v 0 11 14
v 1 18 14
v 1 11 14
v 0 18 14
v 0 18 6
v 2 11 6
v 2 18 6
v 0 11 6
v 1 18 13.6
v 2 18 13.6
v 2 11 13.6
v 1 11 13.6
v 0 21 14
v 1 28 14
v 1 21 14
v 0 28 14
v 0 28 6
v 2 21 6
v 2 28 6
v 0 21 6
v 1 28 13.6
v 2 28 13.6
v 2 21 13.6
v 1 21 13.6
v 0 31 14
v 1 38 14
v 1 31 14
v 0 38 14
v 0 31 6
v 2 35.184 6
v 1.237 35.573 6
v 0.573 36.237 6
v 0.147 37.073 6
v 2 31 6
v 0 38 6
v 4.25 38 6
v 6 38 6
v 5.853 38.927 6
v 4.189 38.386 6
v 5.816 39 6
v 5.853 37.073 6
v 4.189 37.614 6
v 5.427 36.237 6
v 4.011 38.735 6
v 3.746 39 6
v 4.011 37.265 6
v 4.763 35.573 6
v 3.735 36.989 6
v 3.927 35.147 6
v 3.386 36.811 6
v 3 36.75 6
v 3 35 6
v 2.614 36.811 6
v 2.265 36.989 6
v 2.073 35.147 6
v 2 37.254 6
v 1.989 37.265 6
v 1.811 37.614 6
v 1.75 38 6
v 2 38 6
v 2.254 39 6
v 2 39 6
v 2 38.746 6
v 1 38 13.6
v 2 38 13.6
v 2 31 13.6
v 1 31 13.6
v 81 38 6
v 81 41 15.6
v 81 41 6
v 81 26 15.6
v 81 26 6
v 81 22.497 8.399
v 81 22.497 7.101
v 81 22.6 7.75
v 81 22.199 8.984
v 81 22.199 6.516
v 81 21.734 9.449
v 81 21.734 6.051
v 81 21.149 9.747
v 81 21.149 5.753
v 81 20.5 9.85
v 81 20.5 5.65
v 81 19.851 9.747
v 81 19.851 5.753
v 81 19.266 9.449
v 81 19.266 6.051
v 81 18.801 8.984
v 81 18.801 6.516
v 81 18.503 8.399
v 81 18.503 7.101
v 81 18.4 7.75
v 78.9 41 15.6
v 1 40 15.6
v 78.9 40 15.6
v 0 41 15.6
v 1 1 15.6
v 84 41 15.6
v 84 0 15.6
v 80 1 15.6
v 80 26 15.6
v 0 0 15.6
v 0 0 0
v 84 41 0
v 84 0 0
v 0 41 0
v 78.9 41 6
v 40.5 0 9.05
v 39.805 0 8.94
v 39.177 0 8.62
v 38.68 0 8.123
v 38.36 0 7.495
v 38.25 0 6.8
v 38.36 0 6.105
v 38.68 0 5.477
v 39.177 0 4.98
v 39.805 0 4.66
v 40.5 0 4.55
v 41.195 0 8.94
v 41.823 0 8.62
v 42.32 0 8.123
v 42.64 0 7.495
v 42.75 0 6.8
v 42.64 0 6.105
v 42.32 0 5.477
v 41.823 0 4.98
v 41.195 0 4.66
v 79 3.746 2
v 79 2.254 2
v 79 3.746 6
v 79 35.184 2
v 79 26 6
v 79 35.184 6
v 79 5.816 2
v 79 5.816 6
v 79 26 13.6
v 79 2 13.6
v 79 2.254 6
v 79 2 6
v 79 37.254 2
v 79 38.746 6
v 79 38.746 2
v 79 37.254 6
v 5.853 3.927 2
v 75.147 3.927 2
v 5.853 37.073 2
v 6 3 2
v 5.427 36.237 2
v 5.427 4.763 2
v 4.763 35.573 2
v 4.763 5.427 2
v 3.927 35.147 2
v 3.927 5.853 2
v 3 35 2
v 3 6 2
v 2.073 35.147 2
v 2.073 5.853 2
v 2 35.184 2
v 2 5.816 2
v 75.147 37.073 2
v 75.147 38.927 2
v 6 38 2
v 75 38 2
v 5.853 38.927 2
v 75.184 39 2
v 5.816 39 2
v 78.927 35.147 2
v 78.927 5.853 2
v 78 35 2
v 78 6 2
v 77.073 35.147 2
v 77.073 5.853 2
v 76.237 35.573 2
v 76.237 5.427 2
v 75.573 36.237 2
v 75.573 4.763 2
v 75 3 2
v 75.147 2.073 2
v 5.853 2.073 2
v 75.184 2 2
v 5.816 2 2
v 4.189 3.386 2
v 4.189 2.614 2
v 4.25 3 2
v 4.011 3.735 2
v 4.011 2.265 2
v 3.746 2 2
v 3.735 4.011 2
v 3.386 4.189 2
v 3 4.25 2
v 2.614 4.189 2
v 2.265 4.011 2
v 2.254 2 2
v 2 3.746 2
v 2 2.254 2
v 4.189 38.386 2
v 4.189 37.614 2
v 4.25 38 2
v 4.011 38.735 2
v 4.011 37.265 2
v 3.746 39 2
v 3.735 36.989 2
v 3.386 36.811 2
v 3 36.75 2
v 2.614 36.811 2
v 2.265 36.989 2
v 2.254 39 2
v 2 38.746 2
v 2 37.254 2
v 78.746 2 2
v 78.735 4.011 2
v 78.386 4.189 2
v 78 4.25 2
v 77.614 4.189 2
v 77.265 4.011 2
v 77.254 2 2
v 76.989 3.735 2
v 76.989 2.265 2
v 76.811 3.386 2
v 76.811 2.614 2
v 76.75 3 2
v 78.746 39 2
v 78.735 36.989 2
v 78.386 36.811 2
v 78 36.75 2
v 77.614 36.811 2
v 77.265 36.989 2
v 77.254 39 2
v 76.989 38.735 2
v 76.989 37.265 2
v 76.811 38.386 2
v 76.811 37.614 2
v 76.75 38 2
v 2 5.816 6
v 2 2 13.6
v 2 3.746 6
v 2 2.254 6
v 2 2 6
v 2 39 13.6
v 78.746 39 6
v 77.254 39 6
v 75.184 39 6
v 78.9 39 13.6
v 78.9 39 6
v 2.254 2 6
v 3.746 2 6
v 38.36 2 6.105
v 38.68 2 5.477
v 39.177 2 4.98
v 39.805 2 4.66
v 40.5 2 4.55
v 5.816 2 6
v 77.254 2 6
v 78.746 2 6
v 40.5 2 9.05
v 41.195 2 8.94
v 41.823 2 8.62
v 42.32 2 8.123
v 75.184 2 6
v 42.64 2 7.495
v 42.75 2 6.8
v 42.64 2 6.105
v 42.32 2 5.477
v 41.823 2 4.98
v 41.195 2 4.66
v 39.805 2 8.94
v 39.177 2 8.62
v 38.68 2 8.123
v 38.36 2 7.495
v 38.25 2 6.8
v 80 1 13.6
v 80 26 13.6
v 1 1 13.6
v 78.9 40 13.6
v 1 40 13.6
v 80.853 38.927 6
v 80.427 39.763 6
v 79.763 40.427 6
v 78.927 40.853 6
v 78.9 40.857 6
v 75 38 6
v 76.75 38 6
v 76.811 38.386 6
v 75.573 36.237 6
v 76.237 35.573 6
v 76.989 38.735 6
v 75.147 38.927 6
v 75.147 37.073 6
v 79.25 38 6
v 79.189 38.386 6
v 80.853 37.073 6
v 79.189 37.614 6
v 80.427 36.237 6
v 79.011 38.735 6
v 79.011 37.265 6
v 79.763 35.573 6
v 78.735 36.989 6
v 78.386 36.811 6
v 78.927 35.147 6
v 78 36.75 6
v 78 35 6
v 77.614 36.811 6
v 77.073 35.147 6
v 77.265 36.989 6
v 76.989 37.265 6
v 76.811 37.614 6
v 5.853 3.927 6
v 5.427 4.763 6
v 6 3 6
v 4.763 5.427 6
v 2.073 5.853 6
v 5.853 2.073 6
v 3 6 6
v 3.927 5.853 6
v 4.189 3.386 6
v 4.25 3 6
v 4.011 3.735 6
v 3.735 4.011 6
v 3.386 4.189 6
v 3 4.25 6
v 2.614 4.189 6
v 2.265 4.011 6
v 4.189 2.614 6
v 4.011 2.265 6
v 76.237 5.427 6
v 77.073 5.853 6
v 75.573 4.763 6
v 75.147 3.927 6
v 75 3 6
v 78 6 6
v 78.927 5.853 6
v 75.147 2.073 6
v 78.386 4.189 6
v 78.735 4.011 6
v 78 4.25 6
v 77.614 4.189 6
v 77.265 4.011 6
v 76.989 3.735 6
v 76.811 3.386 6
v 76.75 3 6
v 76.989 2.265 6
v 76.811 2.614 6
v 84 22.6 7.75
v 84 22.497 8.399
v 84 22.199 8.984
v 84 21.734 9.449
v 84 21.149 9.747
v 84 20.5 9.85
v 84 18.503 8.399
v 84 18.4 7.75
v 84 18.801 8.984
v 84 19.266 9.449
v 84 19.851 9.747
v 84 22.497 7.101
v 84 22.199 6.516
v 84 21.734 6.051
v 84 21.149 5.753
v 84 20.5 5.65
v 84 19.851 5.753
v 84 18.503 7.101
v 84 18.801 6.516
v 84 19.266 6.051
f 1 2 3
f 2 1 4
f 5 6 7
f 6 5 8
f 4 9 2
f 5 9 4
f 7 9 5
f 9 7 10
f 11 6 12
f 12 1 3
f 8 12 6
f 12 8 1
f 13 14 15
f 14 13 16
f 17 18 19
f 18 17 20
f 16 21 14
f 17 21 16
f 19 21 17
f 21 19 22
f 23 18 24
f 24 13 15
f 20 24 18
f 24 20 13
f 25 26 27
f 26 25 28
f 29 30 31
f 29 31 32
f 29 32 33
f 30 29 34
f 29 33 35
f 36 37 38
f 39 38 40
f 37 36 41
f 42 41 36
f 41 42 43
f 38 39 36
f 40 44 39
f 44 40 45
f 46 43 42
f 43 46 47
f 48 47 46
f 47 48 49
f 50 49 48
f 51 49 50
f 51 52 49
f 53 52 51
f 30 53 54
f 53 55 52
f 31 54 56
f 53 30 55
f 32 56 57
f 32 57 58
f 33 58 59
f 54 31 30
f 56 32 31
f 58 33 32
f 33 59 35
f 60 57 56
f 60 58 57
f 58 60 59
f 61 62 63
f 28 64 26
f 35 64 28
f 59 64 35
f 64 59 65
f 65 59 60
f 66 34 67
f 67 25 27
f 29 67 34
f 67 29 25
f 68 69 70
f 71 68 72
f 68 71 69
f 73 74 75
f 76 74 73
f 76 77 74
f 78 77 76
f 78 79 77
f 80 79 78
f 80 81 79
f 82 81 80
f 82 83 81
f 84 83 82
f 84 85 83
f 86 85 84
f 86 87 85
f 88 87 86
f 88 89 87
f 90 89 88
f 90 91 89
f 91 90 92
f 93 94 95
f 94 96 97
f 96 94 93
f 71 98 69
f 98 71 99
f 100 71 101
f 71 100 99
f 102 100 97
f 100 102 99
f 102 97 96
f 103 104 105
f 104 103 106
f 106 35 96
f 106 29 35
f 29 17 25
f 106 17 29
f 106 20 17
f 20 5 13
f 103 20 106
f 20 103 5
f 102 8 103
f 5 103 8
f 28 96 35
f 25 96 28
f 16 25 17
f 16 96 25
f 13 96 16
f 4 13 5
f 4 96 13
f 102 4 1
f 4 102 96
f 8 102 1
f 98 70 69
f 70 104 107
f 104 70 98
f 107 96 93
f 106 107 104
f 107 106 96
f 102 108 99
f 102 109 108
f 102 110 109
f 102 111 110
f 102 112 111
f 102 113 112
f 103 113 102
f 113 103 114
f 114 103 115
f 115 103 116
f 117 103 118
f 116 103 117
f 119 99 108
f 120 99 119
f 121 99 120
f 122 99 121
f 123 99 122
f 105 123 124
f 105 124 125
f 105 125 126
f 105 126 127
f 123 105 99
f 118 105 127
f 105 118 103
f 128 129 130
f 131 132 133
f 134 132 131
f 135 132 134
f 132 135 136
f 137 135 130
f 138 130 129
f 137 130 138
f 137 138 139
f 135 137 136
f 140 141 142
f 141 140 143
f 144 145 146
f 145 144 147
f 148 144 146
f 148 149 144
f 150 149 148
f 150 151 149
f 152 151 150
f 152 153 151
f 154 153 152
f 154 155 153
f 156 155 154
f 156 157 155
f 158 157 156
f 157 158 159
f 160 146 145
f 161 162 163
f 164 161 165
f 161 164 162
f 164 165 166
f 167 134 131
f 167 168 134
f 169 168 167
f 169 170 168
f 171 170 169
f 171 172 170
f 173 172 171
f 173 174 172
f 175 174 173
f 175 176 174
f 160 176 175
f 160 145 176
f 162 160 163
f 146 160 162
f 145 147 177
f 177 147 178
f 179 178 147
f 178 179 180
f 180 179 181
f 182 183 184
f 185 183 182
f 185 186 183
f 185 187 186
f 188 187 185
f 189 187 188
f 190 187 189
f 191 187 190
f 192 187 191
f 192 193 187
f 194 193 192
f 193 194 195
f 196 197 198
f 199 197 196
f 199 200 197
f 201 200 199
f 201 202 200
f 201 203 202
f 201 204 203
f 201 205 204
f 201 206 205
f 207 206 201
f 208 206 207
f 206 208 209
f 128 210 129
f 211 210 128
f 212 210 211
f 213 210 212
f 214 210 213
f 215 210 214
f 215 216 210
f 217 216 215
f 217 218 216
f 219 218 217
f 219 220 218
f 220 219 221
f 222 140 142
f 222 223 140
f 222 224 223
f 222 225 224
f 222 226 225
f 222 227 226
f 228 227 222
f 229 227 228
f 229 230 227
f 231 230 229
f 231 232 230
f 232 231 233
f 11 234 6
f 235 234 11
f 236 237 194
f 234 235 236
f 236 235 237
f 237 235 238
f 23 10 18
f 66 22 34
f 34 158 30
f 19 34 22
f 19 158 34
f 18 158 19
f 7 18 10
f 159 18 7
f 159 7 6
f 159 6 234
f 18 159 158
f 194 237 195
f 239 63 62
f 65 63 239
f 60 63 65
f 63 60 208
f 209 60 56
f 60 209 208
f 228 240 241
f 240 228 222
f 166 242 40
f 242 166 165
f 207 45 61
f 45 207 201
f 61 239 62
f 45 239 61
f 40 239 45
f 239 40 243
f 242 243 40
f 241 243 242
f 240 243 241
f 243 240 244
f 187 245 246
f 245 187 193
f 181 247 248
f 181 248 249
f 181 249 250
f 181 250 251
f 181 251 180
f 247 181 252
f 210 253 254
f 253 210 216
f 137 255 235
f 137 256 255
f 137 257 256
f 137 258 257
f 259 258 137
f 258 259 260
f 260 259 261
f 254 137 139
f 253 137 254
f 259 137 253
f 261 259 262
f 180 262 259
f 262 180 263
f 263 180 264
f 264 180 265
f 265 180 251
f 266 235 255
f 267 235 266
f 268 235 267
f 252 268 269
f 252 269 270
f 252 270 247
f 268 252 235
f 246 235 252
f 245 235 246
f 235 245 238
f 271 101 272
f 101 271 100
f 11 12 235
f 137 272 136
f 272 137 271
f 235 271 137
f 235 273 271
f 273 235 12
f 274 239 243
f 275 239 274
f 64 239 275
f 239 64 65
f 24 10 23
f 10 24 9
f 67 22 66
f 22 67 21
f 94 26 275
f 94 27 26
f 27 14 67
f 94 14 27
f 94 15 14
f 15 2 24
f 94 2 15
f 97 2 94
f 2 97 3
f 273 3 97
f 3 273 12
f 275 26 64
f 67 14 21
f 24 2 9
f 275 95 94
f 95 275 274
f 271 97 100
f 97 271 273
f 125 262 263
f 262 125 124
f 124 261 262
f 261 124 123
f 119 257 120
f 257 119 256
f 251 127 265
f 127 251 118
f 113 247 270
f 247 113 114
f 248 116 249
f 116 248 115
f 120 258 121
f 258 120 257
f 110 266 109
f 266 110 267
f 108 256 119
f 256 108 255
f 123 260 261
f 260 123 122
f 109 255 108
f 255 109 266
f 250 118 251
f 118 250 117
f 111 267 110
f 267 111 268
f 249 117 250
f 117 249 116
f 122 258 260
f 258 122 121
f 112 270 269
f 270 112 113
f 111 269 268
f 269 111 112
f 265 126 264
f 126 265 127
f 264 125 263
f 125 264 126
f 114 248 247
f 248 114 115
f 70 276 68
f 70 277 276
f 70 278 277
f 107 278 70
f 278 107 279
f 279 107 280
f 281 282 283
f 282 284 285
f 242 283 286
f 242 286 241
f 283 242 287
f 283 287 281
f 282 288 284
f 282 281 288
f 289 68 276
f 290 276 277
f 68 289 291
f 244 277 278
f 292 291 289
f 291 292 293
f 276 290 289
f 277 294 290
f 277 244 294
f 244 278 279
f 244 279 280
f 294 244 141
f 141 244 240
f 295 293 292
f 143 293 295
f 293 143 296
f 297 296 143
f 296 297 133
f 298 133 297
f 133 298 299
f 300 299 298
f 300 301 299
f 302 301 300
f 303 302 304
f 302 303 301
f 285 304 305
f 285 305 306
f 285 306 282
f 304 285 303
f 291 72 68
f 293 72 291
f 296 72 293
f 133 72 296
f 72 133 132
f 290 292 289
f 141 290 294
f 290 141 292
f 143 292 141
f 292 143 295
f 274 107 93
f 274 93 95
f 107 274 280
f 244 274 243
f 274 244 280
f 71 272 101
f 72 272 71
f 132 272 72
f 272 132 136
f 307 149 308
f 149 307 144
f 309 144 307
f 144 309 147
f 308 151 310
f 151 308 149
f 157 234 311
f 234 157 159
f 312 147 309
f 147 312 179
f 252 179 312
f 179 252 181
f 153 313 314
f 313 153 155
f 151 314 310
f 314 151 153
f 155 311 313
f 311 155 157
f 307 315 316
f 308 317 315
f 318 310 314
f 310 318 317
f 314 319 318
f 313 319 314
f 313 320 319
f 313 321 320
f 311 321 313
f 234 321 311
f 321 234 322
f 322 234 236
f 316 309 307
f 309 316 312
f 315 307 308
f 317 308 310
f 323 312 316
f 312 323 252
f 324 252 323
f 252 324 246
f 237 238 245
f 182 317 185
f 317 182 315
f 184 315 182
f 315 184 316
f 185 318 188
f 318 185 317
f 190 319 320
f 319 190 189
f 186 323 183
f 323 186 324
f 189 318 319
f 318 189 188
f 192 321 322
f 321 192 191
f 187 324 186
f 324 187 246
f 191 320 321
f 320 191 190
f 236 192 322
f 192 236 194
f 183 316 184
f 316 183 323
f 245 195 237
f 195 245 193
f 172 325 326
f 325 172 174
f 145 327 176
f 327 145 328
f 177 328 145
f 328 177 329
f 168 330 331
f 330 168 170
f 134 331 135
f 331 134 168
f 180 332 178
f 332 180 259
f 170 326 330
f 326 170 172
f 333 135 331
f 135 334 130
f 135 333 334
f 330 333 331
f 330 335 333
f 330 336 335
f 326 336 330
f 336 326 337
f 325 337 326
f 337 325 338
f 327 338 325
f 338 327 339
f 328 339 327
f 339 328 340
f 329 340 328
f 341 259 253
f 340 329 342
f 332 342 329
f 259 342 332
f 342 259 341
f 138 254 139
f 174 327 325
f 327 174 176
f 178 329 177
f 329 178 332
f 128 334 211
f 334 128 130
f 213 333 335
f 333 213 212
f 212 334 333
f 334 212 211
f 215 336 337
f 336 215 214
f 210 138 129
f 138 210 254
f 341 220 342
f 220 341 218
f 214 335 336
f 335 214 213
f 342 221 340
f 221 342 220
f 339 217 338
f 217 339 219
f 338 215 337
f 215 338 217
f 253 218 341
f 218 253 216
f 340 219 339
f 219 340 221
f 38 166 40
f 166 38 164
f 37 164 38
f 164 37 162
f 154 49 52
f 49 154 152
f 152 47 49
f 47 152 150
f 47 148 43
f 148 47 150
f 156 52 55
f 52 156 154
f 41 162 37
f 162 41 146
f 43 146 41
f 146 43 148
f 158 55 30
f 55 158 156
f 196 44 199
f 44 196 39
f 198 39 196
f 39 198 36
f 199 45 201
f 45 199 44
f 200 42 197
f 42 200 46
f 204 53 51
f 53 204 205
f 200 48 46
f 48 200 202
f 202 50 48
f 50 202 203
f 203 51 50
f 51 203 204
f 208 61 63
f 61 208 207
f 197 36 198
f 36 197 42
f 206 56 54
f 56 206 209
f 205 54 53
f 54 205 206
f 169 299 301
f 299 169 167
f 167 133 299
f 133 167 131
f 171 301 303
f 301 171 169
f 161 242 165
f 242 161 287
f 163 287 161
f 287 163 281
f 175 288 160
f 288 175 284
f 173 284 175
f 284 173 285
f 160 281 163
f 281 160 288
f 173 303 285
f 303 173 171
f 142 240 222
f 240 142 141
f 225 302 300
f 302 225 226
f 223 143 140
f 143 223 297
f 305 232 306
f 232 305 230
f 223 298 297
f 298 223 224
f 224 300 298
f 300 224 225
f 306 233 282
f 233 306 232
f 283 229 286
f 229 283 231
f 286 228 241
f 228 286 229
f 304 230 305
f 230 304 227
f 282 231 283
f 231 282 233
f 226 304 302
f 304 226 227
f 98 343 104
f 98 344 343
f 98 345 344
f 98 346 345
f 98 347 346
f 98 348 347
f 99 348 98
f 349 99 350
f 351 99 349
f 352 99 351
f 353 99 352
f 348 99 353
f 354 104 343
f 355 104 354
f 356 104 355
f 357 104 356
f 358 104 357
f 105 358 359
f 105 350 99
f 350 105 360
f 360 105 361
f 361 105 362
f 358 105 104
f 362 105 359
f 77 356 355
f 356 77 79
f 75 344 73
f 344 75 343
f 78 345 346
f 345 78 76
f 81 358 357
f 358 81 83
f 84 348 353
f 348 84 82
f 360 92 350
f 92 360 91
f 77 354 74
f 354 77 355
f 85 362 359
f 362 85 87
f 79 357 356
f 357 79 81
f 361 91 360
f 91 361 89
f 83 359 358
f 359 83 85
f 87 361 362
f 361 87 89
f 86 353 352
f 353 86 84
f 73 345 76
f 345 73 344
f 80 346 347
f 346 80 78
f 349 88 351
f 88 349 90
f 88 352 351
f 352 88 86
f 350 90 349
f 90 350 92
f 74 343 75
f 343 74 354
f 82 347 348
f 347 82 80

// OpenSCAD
/*
 * Temperature Controller Box
 * 
 * Author: Colin Bitterfield
 * Email: colin@bitterfield.com  
 * Date Created: 2025-08-28
 * Date Updated: 2025-08-28
 * Version: 0.1.0
 *
 * Description: Parametric enclosure for temperature controller boards with display window,
 * cable management, and mounting integration for solar charge controller cooling system
 */

// ===== USER CONFIGURATION =====
component = 1; // 1=front_case, 2=back_panel, 3=assembly_with_board

// ===== BOARD DIMENSIONS (measured from ruler image) =====
board_length = 75;      // PCB length (from ruler)
board_width = 35;       // PCB width (from ruler)
board_thickness = 1.6;  // Standard PCB thickness
display_width = 22.7;   // 4-digit 7-segment display width
display_height = 14.1;  // 4-digit 7-segment display height
display_offset_x = 10;  // Display position from left edge (measured)  
display_offset_y = 35 - 7 - 14.1;   // Position from bottom (board_width - distance_from_top - display_height)

// ===== BOX PARAMETERS (2-piece design) =====
wall_thickness = 2;     // Wall thickness
base_thickness = 2;     // Bottom thickness
back_thickness = 2;     // Back panel thickness
clearance = 1;          // Clearance around board
standoff_height = 4;    // Height of PCB standoffs (reduced for compact design)
standoff_dia = 6;       // Standoff diameter
screw_dia = 2.5;        // Mounting screw diameter (M2.5)
case_lip = 1;           // Back panel overlap lip

// Cable management
cable_dia = 4;          // Sensor cable diameter
blue_connector_width = 15;   // Right blue connector width
blue_connector_height = 10;  // Right blue connector height
jst_connector_width = 7;     // JST 2.54mm connector width
jst_connector_height = 8;    // JST 2.54mm connector height
wire_clearance = 10;         // Extra height for wire connections

// Display window
window_margin = 2;      // Extra margin around display

// Calculate internal dimensions (compact 2-piece design)
internal_length = board_length + 2 * clearance;
internal_width = board_width + 2 * clearance;
internal_height = standoff_height + board_thickness + 8; // 8mm clearance above board (compact)

// Calculate external dimensions
external_length = internal_length + 2 * wall_thickness;
external_width = internal_width + 2 * wall_thickness;
external_height = internal_height + base_thickness;

// Back panel dimensions (overlaps case edges)
back_length = external_length + 2 * case_lip;
back_width = external_width + 2 * case_lip;

// ===== MODULES =====

module front_case() {
    difference() {
        // Outer shell (no top - open for back panel)
        cube([external_length, external_width, external_height]);
        
        // Inner cavity (goes all the way through top)
        translate([wall_thickness, wall_thickness, base_thickness])
            cube([internal_length, internal_width, internal_height + 1]);
        
        // Back panel lip recess (around top edge)
        translate([wall_thickness - case_lip, wall_thickness - case_lip, external_height - back_thickness])
            cube([internal_length + 2*case_lip, internal_width + 2*case_lip, back_thickness + 1]);
        
        // Sensor cable hole (front)
        translate([external_length/2, -0.1, base_thickness + standoff_height + board_thickness/2])
            rotate([-90, 0, 0])
                cylinder(d=cable_dia + 0.5, h=wall_thickness + 0.2, $fn=20);
        
        // Blue connector side access (right side)
        translate([external_length - wall_thickness - 0.1, wall_thickness + clearance + board_width - 12, 
                   base_thickness + standoff_height])
            cube([wall_thickness + 0.2, blue_connector_width, blue_connector_height]);
        
        // JST connector access slots (left side - 3 connectors)
        for(i = [0:2]) {
            translate([-0.1, wall_thickness + clearance + 8 + i*10, 
                       base_thickness + standoff_height])
                cube([wall_thickness + 0.2, jst_connector_width, jst_connector_height]);
        }
    }
    
    // PCB standoffs
    translate([wall_thickness + clearance, wall_thickness + clearance, base_thickness]) {
        // Four corner standoffs
        standoff(0, 0);
        standoff(board_length, 0);
        standoff(0, board_width);
        standoff(board_length, board_width);
    }
    
    // Rail mounting bracket (mounts flush against right rail)
    bracket_width = 20;
    bracket_thickness = 3;
    
    // Mounting bracket extends from right side
    translate([external_length, 0, 0])
        difference() {
            cube([bracket_thickness, external_width, external_height]);
            
            // Holes to align with rail mounting holes (25% and 75% of rail height)
            // Assuming 31mm rail height for MPPT 100/30
            rail_height = 31;
            first_hole_pos = rail_height * 0.25;   // 7.75mm
            second_hole_pos = rail_height * 0.75;  // 23.25mm
            
            translate([-0.1, external_width/2, first_hole_pos])
                rotate([0, 90, 0])
                    cylinder(d=4.2, h=bracket_thickness + 0.2, $fn=20);
            translate([-0.1, external_width/2, second_hole_pos])
                rotate([0, 90, 0])
                    cylinder(d=4.2, h=bracket_thickness + 0.2, $fn=20);
        }
}

module standoff(x, y) {
    translate([x, y, 0]) {
        difference() {
            cylinder(d=standoff_dia, h=standoff_height, $fn=20);
            translate([0, 0, -0.1])
                cylinder(d=screw_dia, h=standoff_height + 0.2, $fn=20);
        }
    }
}

module back_panel() {
    // Calculate connector positions for access holes
    window_x = wall_thickness + clearance + display_offset_x - window_margin;
    window_y = wall_thickness + clearance + display_offset_y - window_margin;
    window_width = display_width + 2 * window_margin;
    window_height = display_height + 2 * window_margin;
    
    difference() {
        // Main back panel (overlaps case edges)
        cube([back_length, back_width, back_thickness]);
        
        // Display window cutout
        translate([case_lip + window_x, case_lip + window_y, -0.1])
            cube([window_width, window_height, back_thickness + 0.2]);
        
        // Blue connector top access
        translate([case_lip + wall_thickness + clearance + board_length - blue_connector_width - 2, 
                   case_lip + wall_thickness + clearance + board_width - 12, -0.1])
            cube([blue_connector_width + 2, blue_connector_height + 2, back_thickness + 0.2]);
        
        // JST connector top access (4 connectors)
        // Left side JST connectors
        for(i = [0:2]) {
            translate([case_lip + wall_thickness + clearance + 2 - 2, 
                       case_lip + wall_thickness + clearance + 8 + i*10 - 1, -0.1])
                cube([jst_connector_width + 2, jst_connector_height + 2, back_thickness + 0.2]);
        }
        
        // Right edge JST connector 
        translate([case_lip + wall_thickness + clearance + board_length - 8, 
                   case_lip + wall_thickness + clearance + 5 - 1, -0.1])
            cube([jst_connector_width + 2, jst_connector_height + 8, back_thickness + 0.2]);
        
        // Ventilation holes pattern (avoid connector areas)
        vent_spacing = 6;
        vent_dia = 2;
        
        for (x = [vent_spacing : vent_spacing : back_length - vent_spacing]) {
            for (y = [vent_spacing : vent_spacing : back_width - vent_spacing]) {
                // Skip holes in display and connector areas (similar logic with offset for lip)
                display_conflict = (x >= case_lip + window_x - vent_dia && x <= case_lip + window_x + window_width + vent_dia &&
                                   y >= case_lip + window_y - vent_dia && y <= case_lip + window_y + window_height + vent_dia);
                
                if (!display_conflict) {
                    translate([x, y, -0.1])
                        cylinder(d=vent_dia, h=back_thickness + 0.2, $fn=10);
                }
            }
        }
        
        // Corner screw holes for panel attachment
        panel_screw_inset = 3;
        translate([panel_screw_inset, panel_screw_inset, -0.1])
            cylinder(d=2.5, h=back_thickness + 0.2, $fn=20);
        translate([back_length - panel_screw_inset, panel_screw_inset, -0.1])
            cylinder(d=2.5, h=back_thickness + 0.2, $fn=20);
        translate([panel_screw_inset, back_width - panel_screw_inset, -0.1])
            cylinder(d=2.5, h=back_thickness + 0.2, $fn=20);
        translate([back_length - panel_screw_inset, back_width - panel_screw_inset, -0.1])
            cylinder(d=2.5, h=back_thickness + 0.2, $fn=20);
    }
}

module pcb_visualization() {
    // PCB board (75×35mm)
    color("darkgreen") 
        cube([board_length, board_width, board_thickness]);
    
    // 4-digit 7-segment display (22.7×14.1mm, positioned 10mm from left, 7mm from top)
    color("black") 
        translate([display_offset_x, display_offset_y, board_thickness])
            cube([display_width, display_height, 2]);
    
    // 7-segment display digits showing "19.9" (4 digits)
    color("red") 
        translate([display_offset_x + 0.5, display_offset_y + 1, board_thickness + 2.1]) {
            digit_width = (display_width - 1) / 4;  // ~5.4mm per digit
            digit_height = display_height - 2;       // ~12.1mm height
            
            // Digit positions across the display
            for(digit_pos = [0:3]) {
                translate([digit_pos * digit_width, 0, 0]) {
                    // 7-segment pattern (a-g segments)
                    seg_width = digit_width * 0.7;
                    seg_height = digit_height * 0.45;
                    seg_thickness = 0.8;
                    
                    // Horizontal segments (a, d, g)
                    translate([seg_width * 0.1, 0, 0]) 
                        cube([seg_width * 0.8, seg_thickness, 0.1]);  // Top (a)
                    translate([seg_width * 0.1, seg_height, 0]) 
                        cube([seg_width * 0.8, seg_thickness, 0.1]);  // Middle (g)  
                    translate([seg_width * 0.1, seg_height * 2, 0]) 
                        cube([seg_width * 0.8, seg_thickness, 0.1]);  // Bottom (d)
                    
                    // Vertical segments (b, c, e, f)
                    translate([0, seg_thickness, 0]) 
                        cube([seg_thickness, seg_height * 0.8, 0.1]); // Top left (f)
                    translate([seg_width - seg_thickness, seg_thickness, 0]) 
                        cube([seg_thickness, seg_height * 0.8, 0.1]); // Top right (b)
                    translate([0, seg_height + seg_thickness, 0]) 
                        cube([seg_thickness, seg_height * 0.8, 0.1]); // Bottom left (e)
                    translate([seg_width - seg_thickness, seg_height + seg_thickness, 0]) 
                        cube([seg_thickness, seg_height * 0.8, 0.1]); // Bottom right (c)
                }
            }
            
            // Decimal point after third digit (for "19.9")
            translate([3 * digit_width + 0.5, digit_height * 1.8, 0])
                cylinder(d=1, h=0.1, $fn=8);
        }
    
    // Blue connector (top right)
    color("blue") 
        translate([board_length - blue_connector_width - 2, board_width - 12, board_thickness])
            cube([blue_connector_width, blue_connector_height, 6]);
    
    // Red push buttons (3 buttons, first at 16.3mm from left)
    color("red") {
        translate([16.3, 3, board_thickness]) cylinder(d=4, h=1.5, $fn=20);
        translate([26.3, 3, board_thickness]) cylinder(d=4, h=1.5, $fn=20);
        translate([36.3, 3, board_thickness]) cylinder(d=4, h=1.5, $fn=20);
    }
    
    // JST connectors (left side, 3 connectors)
    color("white") {
        for(i = [0:2]) {
            translate([2, 8 + i*10, board_thickness])
                cube([6, jst_connector_width, jst_connector_height]);
        }
    }
    
    // JST connector (right edge)
    color("white") 
        translate([board_length - 8, 5, board_thickness])
            cube([6, jst_connector_width + 8, jst_connector_height]);
    
    // Sensor cable connector
    color("white") {
        translate([board_length/2, 2, board_thickness])
            cube([4, 6, 3]);
        // Cable wire
        translate([board_length/2 + 2, 5, board_thickness + 3])
            cylinder(d=cable_dia, h=15, $fn=20);
    }
    
    // Component chips and capacitors
    color("black") {
        translate([55, 15, board_thickness]) cube([8, 6, 2]);
        translate([45, 25, board_thickness]) cube([6, 4, 1]);
        translate([60, 8, board_thickness]) cube([4, 3, 1.5]);
        // Large capacitor
        translate([10, 20, board_thickness]) cylinder(d=6, h=8, $fn=20);
    }
}

module assembly_with_board() {
    // Front case (transparent)
    color("lightblue", 0.3) front_case();
    
    // PCB in position
    translate([wall_thickness + clearance, wall_thickness + clearance, base_thickness + standoff_height])
        pcb_visualization();
    
    // Back panel (transparent, offset by lip amount)
    color("lightgreen", 0.3) 
        translate([-case_lip, -case_lip, external_height])
            back_panel();
    
    // Show cable routing
    color("red", 0.7) {
        // Sensor cable path
        translate([wall_thickness + clearance + board_length/2, wall_thickness + clearance + 2, 
                   base_thickness + standoff_height + board_thickness + 3])
            cube([2, wall_thickness + clearance - 2, 2]);
    }
}

// ===== MAIN EXECUTION =====
if (component == 1) {
    front_case();
    echo(str("Front case: ", external_length, "×", external_width, "×", external_height, "mm"));
} else if (component == 2) {
    back_panel();
    echo(str("Back panel: ", back_length, "×", back_width, "×", back_thickness, "mm"));
} else if (component == 3) {
    assembly_with_board();
    echo("2-piece assembly view with PCB visualization");
} else {
    echo("ERROR: Component must be 1 (front_case), 2 (back_panel), or 3 (assembly_with_board)");
}

// ===== ASSEMBLY PREVIEW =====
// Uncomment to see assembled view
/*
color("lightblue", 0.7) front_case();
color("lightgreen", 0.7) translate([-case_lip, -case_lip, external_height]) back_panel();
*/
